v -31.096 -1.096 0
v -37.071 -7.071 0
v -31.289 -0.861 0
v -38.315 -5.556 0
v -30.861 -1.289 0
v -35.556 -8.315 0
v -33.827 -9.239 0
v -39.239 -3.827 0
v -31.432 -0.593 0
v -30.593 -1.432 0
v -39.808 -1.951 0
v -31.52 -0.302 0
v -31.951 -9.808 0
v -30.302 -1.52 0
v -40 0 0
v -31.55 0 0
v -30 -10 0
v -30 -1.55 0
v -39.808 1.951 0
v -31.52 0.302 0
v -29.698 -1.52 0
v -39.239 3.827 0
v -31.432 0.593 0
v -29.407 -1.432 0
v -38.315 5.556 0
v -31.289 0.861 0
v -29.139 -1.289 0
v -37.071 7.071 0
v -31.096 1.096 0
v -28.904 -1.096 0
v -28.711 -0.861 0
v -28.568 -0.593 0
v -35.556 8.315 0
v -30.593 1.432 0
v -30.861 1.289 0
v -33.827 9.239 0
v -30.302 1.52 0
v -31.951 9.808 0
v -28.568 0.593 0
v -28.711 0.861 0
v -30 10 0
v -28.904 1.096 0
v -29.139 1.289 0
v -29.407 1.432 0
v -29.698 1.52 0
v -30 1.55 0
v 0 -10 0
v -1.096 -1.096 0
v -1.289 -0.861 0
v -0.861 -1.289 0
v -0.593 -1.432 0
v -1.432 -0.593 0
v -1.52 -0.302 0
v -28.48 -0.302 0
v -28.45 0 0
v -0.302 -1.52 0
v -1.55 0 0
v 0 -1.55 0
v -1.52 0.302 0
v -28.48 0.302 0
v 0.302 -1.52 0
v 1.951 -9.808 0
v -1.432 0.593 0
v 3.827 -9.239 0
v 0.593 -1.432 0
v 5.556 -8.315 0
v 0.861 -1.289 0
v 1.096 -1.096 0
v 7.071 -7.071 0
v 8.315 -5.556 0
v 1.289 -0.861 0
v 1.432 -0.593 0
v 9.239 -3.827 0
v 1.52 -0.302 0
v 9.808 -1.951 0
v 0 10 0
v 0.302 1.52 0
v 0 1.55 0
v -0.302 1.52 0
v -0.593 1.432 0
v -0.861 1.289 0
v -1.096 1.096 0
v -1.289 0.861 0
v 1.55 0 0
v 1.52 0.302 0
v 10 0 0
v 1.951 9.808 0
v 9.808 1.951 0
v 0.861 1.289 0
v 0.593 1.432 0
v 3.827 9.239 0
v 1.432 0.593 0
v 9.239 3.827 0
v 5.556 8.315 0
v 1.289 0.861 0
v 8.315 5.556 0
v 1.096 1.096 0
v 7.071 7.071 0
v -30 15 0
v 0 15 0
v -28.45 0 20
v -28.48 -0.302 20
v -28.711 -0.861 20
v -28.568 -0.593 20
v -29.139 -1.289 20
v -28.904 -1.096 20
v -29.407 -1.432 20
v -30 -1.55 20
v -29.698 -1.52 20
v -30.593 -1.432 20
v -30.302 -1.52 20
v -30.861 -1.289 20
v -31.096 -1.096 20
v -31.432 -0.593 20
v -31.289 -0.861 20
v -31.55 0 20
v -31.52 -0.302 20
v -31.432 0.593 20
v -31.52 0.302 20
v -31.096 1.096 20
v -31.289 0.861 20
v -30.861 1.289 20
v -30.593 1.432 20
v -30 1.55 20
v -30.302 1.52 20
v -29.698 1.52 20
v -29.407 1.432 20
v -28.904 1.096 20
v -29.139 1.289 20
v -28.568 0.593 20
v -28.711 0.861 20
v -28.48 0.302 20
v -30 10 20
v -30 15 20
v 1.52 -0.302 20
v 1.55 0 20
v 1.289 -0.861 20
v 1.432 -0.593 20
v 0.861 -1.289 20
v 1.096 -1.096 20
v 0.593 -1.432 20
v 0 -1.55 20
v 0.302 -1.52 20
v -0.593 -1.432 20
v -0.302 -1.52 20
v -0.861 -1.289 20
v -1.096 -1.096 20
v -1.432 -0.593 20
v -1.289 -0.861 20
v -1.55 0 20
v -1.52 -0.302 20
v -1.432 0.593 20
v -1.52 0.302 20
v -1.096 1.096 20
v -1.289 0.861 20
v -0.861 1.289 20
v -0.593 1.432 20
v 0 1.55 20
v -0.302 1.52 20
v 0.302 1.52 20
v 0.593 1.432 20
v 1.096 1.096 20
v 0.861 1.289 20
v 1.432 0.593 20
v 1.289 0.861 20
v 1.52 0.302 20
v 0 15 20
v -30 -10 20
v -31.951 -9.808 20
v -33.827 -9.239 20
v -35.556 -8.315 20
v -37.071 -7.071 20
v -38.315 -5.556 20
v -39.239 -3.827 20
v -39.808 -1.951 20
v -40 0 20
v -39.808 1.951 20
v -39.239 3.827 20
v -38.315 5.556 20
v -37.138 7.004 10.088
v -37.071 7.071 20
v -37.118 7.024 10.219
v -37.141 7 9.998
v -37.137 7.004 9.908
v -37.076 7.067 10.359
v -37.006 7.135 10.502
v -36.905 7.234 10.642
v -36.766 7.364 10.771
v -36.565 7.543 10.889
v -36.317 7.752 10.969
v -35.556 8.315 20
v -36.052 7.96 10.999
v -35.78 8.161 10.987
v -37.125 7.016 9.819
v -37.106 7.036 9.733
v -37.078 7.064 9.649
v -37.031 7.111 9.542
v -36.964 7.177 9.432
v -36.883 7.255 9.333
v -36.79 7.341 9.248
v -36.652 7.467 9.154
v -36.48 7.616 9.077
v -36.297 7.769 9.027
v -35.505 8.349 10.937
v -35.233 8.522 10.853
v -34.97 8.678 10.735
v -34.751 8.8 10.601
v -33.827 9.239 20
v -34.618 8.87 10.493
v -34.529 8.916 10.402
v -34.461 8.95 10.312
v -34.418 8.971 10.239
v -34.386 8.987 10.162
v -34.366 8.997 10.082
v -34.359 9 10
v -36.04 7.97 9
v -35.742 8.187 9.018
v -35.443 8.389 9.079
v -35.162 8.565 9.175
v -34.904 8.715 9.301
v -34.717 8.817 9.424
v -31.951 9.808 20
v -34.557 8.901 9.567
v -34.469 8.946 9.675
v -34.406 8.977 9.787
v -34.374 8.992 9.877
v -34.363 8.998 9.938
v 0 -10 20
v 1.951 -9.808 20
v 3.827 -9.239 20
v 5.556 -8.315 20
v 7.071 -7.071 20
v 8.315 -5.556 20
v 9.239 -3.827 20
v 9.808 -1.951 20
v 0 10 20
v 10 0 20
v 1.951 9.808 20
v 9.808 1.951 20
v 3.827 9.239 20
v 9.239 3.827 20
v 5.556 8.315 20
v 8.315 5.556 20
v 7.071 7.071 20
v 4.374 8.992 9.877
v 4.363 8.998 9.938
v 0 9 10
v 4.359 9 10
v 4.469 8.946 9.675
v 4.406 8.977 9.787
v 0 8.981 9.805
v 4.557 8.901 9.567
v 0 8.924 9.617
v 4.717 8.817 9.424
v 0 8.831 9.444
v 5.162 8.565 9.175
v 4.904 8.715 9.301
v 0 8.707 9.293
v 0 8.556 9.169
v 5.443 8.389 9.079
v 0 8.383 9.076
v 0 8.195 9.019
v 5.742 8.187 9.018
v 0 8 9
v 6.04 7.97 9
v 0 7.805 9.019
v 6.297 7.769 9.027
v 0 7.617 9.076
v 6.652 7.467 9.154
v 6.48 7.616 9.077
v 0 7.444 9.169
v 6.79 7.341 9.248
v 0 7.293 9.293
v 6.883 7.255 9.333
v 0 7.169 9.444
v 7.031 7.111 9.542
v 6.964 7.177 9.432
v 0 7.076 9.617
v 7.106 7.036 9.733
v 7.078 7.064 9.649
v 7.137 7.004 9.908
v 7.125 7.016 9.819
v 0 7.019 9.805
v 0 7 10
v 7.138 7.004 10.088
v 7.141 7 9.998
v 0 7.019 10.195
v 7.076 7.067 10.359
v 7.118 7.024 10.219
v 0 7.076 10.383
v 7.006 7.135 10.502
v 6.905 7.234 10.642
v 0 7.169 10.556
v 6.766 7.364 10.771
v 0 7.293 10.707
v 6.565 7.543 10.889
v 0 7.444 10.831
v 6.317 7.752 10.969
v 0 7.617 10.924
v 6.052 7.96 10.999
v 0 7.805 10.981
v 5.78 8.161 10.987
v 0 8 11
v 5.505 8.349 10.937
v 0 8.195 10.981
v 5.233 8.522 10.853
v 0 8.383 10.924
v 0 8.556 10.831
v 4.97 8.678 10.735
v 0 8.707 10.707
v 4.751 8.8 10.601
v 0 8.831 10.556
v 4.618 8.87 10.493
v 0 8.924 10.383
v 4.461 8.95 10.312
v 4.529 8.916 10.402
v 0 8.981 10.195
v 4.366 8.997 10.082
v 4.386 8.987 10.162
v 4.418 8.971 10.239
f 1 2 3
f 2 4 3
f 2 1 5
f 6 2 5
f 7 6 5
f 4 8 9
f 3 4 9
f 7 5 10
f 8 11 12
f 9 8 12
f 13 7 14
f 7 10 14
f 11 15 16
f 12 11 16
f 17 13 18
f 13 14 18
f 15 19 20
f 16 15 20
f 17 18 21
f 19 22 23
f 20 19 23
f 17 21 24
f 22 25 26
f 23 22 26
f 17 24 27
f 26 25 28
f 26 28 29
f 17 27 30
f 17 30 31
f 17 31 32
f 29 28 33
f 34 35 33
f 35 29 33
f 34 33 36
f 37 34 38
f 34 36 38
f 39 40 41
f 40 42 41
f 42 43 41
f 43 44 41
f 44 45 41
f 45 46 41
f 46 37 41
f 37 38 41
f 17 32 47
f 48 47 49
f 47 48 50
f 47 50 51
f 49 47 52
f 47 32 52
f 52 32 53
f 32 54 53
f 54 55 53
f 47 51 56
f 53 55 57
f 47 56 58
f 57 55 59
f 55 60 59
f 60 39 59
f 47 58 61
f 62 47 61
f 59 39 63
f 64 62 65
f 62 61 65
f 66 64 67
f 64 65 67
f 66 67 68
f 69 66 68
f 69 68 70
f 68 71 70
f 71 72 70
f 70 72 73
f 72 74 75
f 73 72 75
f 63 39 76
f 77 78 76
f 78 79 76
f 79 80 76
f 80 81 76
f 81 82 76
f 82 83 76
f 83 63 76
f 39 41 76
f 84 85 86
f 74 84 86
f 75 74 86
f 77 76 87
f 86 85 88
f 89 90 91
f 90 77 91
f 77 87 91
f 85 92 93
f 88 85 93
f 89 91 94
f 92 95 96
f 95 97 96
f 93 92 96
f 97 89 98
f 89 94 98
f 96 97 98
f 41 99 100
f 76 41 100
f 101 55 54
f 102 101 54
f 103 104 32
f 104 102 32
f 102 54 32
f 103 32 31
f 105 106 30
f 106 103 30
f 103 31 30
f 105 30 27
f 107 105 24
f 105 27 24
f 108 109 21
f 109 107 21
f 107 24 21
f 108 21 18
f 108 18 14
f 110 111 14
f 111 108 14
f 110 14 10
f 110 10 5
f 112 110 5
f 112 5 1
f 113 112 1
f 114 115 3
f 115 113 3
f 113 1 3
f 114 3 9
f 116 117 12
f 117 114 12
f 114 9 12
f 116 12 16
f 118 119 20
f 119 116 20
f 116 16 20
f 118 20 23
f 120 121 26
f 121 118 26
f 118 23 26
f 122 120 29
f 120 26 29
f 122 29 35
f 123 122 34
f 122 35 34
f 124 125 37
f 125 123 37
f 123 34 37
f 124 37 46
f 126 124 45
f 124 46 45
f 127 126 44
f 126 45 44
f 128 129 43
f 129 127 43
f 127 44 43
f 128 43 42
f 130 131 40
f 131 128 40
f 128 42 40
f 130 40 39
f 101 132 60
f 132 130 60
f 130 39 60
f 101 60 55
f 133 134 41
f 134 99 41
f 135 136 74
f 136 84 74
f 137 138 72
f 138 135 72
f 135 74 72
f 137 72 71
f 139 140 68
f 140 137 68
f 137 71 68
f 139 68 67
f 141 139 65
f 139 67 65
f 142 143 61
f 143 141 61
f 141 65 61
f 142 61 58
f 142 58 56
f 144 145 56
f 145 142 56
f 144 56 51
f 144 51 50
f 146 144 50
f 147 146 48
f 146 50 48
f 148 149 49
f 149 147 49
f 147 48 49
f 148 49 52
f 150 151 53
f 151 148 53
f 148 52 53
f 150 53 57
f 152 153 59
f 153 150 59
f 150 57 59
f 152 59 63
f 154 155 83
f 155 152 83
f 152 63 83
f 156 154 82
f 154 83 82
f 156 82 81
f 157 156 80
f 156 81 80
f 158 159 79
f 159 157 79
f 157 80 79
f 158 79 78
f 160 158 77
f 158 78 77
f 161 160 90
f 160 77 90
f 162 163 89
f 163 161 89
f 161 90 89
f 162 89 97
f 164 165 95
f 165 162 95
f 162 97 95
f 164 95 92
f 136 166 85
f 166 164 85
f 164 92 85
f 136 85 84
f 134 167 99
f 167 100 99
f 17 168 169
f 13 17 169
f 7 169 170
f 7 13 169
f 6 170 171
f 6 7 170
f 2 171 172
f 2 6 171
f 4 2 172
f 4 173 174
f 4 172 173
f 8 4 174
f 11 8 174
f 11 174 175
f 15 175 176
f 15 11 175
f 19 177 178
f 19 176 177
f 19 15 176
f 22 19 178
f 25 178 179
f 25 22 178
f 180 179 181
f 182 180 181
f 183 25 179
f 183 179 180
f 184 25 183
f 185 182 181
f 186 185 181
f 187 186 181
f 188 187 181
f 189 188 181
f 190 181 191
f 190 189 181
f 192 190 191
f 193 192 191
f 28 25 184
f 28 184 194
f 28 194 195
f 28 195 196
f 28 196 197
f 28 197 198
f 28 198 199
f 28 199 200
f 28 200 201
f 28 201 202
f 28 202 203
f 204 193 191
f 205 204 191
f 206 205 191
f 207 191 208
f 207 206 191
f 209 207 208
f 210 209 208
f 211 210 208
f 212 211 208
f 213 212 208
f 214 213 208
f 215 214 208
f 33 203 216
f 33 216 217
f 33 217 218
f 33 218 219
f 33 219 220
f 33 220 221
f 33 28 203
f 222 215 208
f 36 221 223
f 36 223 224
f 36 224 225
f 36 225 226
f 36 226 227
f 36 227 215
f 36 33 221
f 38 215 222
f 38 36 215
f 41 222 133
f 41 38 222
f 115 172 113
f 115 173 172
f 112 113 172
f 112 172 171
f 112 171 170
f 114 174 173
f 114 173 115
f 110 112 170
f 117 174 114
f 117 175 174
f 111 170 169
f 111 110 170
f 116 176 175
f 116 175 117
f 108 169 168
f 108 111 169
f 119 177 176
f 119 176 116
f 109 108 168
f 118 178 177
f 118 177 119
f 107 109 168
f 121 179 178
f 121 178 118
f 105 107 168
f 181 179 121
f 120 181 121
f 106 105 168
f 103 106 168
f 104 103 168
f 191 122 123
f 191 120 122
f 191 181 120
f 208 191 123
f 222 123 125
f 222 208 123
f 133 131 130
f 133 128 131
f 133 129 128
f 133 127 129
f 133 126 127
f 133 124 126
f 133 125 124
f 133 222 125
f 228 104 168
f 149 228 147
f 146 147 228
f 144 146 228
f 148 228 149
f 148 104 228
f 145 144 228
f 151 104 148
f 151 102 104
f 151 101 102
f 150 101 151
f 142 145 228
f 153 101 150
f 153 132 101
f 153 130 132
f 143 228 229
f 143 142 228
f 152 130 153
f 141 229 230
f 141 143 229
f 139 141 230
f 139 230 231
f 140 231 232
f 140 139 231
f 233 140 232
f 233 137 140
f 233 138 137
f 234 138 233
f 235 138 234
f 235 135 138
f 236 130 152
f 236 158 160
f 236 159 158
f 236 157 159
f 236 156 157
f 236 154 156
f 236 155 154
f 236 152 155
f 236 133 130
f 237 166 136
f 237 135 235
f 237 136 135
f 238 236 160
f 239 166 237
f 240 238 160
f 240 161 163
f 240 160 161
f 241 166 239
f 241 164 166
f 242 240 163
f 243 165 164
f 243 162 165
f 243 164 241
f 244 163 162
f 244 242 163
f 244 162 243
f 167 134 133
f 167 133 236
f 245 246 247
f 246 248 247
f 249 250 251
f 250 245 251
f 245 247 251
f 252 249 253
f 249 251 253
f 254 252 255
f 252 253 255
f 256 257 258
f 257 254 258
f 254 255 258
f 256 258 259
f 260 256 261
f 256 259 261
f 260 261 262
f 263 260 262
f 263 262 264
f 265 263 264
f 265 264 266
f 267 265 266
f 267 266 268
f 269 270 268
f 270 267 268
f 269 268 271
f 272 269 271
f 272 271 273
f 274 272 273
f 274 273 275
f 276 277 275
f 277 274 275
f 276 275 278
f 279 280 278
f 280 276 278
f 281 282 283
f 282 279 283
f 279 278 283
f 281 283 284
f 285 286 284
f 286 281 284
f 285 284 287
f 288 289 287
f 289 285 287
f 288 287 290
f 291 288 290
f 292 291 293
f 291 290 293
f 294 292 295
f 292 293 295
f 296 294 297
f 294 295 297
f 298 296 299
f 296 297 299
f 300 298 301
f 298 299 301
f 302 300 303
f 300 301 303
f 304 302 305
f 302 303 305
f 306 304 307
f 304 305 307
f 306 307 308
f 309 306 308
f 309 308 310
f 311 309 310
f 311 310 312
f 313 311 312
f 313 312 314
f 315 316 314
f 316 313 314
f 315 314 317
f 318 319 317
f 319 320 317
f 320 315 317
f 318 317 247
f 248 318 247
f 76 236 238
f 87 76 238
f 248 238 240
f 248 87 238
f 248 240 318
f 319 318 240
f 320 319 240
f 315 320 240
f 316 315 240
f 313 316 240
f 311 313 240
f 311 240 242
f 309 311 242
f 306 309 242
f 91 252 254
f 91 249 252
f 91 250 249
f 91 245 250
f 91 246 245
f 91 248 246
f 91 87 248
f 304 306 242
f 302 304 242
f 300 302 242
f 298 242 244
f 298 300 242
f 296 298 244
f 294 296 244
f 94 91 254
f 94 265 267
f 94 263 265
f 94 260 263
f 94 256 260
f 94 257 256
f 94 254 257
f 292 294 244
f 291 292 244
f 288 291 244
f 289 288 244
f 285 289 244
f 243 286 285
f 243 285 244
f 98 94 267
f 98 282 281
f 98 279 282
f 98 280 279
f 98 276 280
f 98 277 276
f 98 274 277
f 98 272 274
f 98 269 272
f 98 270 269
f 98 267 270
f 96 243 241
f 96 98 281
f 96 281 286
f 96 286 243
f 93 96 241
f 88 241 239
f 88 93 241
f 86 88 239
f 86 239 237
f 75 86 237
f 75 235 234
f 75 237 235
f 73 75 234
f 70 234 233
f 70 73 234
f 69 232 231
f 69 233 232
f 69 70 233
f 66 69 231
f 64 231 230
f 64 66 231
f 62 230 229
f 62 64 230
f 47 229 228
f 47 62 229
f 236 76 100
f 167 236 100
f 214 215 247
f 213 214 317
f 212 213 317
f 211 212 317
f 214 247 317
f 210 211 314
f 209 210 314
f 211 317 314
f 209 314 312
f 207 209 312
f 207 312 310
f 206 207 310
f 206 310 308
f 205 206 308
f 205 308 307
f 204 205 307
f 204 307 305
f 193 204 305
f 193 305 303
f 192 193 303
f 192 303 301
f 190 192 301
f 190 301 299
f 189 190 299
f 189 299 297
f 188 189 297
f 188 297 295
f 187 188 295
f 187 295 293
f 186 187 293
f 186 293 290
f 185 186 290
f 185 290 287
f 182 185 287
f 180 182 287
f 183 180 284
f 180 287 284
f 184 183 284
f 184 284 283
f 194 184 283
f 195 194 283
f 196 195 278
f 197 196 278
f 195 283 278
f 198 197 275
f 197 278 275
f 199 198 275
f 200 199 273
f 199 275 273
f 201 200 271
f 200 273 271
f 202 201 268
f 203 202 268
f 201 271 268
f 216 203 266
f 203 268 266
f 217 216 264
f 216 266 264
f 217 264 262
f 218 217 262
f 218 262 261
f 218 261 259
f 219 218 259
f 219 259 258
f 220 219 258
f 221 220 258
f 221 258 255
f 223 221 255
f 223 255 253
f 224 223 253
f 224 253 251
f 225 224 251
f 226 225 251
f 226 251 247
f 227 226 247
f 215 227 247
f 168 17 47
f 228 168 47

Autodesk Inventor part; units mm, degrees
ref_plane "YZ Plane" through (0, 0, 0) normal (1, 0, 0) x (0, 1, 0)
ref_plane "XZ Plane" through (0, 0, 0) normal (0, 1, 0) x (-1, 0, 0)
ref_plane "XY Plane" through (0, 0, 0) normal (0, 0, 1) x (1, 0, 0)
sketch "Sketch1" plane through (0, 0, 0) normal (0, 0, 1) x (1, 0, 0)
  line L0 (0, 0) -> (-30, 0) construction
  line L1 (0, 10) -> (-30, 10)
  line L2 (-30, -10) -> (0, -10)
  arc A0 (0, -10) -> (0, 10) centre (0, 0) ccw
  arc A1 (-30, 10) -> (-30, -10) centre (-30, 0) ccw
  circle A2 centre (-30, 0) radius 1.55
  circle A3 centre (0, 0) radius 1.55
  line L3 (-30, 10) -> (0, 10)
  line L4 (0, 10) -> (0, 15)
  line L5 (0, 15) -> (-30, 15)
  line L6 (-30, 15) -> (-30, 10)
  point P0 (-15, 0)
  dimension "d0" = 20
  dimension "d1" = 30
  dimension "d2" = 3.1
  dimension "d3" = 3.1
  dimension "d7" = 5
extrude "Extrusion1" add sketch "Sketch1" along normal blind 20
sketch "Sketch3" plane through (0, 0, 0) normal (1, 0, 0) x (0, 1, 0)
  circle A0 centre (8, 10) radius 1
  point P0 (0, 0)
  dimension "d8" = 2
  dimension "d9" = 8
  dimension "d10" = 10
extrude "Extrusion2" cut sketch "Sketch3" along normal mid plane 100
